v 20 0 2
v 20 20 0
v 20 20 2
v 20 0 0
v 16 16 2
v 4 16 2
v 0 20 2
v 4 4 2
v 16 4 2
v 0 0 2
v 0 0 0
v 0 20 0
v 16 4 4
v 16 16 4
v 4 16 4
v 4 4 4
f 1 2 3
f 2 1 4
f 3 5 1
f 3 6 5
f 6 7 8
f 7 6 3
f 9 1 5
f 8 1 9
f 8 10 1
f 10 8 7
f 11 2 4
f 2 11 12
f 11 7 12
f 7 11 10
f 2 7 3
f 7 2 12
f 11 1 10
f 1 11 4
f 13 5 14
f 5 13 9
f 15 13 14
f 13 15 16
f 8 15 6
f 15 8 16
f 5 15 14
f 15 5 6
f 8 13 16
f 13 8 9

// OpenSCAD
render_part = "all";
export_single_design = 1;
pmm_object_selector_param = "export_single_design";
pmm_part_selector_param = "render_part";
pmm_objects = [[1, "Colored layers"]];
base_color = "Red";
text_color = "Blue";
module placed_design(i) {
    if (render_part == "all" || render_part == "base")
        color(base_color) cube([20, 20, 2]);
    if (render_part == "all" || render_part == "tag_text")
        color(text_color) translate([4, 4, 2]) cube([12, 12, 2]);
}
// GENERATED RENDER BLOCK START
placed_design(export_single_design);
// GENERATED RENDER BLOCK END
